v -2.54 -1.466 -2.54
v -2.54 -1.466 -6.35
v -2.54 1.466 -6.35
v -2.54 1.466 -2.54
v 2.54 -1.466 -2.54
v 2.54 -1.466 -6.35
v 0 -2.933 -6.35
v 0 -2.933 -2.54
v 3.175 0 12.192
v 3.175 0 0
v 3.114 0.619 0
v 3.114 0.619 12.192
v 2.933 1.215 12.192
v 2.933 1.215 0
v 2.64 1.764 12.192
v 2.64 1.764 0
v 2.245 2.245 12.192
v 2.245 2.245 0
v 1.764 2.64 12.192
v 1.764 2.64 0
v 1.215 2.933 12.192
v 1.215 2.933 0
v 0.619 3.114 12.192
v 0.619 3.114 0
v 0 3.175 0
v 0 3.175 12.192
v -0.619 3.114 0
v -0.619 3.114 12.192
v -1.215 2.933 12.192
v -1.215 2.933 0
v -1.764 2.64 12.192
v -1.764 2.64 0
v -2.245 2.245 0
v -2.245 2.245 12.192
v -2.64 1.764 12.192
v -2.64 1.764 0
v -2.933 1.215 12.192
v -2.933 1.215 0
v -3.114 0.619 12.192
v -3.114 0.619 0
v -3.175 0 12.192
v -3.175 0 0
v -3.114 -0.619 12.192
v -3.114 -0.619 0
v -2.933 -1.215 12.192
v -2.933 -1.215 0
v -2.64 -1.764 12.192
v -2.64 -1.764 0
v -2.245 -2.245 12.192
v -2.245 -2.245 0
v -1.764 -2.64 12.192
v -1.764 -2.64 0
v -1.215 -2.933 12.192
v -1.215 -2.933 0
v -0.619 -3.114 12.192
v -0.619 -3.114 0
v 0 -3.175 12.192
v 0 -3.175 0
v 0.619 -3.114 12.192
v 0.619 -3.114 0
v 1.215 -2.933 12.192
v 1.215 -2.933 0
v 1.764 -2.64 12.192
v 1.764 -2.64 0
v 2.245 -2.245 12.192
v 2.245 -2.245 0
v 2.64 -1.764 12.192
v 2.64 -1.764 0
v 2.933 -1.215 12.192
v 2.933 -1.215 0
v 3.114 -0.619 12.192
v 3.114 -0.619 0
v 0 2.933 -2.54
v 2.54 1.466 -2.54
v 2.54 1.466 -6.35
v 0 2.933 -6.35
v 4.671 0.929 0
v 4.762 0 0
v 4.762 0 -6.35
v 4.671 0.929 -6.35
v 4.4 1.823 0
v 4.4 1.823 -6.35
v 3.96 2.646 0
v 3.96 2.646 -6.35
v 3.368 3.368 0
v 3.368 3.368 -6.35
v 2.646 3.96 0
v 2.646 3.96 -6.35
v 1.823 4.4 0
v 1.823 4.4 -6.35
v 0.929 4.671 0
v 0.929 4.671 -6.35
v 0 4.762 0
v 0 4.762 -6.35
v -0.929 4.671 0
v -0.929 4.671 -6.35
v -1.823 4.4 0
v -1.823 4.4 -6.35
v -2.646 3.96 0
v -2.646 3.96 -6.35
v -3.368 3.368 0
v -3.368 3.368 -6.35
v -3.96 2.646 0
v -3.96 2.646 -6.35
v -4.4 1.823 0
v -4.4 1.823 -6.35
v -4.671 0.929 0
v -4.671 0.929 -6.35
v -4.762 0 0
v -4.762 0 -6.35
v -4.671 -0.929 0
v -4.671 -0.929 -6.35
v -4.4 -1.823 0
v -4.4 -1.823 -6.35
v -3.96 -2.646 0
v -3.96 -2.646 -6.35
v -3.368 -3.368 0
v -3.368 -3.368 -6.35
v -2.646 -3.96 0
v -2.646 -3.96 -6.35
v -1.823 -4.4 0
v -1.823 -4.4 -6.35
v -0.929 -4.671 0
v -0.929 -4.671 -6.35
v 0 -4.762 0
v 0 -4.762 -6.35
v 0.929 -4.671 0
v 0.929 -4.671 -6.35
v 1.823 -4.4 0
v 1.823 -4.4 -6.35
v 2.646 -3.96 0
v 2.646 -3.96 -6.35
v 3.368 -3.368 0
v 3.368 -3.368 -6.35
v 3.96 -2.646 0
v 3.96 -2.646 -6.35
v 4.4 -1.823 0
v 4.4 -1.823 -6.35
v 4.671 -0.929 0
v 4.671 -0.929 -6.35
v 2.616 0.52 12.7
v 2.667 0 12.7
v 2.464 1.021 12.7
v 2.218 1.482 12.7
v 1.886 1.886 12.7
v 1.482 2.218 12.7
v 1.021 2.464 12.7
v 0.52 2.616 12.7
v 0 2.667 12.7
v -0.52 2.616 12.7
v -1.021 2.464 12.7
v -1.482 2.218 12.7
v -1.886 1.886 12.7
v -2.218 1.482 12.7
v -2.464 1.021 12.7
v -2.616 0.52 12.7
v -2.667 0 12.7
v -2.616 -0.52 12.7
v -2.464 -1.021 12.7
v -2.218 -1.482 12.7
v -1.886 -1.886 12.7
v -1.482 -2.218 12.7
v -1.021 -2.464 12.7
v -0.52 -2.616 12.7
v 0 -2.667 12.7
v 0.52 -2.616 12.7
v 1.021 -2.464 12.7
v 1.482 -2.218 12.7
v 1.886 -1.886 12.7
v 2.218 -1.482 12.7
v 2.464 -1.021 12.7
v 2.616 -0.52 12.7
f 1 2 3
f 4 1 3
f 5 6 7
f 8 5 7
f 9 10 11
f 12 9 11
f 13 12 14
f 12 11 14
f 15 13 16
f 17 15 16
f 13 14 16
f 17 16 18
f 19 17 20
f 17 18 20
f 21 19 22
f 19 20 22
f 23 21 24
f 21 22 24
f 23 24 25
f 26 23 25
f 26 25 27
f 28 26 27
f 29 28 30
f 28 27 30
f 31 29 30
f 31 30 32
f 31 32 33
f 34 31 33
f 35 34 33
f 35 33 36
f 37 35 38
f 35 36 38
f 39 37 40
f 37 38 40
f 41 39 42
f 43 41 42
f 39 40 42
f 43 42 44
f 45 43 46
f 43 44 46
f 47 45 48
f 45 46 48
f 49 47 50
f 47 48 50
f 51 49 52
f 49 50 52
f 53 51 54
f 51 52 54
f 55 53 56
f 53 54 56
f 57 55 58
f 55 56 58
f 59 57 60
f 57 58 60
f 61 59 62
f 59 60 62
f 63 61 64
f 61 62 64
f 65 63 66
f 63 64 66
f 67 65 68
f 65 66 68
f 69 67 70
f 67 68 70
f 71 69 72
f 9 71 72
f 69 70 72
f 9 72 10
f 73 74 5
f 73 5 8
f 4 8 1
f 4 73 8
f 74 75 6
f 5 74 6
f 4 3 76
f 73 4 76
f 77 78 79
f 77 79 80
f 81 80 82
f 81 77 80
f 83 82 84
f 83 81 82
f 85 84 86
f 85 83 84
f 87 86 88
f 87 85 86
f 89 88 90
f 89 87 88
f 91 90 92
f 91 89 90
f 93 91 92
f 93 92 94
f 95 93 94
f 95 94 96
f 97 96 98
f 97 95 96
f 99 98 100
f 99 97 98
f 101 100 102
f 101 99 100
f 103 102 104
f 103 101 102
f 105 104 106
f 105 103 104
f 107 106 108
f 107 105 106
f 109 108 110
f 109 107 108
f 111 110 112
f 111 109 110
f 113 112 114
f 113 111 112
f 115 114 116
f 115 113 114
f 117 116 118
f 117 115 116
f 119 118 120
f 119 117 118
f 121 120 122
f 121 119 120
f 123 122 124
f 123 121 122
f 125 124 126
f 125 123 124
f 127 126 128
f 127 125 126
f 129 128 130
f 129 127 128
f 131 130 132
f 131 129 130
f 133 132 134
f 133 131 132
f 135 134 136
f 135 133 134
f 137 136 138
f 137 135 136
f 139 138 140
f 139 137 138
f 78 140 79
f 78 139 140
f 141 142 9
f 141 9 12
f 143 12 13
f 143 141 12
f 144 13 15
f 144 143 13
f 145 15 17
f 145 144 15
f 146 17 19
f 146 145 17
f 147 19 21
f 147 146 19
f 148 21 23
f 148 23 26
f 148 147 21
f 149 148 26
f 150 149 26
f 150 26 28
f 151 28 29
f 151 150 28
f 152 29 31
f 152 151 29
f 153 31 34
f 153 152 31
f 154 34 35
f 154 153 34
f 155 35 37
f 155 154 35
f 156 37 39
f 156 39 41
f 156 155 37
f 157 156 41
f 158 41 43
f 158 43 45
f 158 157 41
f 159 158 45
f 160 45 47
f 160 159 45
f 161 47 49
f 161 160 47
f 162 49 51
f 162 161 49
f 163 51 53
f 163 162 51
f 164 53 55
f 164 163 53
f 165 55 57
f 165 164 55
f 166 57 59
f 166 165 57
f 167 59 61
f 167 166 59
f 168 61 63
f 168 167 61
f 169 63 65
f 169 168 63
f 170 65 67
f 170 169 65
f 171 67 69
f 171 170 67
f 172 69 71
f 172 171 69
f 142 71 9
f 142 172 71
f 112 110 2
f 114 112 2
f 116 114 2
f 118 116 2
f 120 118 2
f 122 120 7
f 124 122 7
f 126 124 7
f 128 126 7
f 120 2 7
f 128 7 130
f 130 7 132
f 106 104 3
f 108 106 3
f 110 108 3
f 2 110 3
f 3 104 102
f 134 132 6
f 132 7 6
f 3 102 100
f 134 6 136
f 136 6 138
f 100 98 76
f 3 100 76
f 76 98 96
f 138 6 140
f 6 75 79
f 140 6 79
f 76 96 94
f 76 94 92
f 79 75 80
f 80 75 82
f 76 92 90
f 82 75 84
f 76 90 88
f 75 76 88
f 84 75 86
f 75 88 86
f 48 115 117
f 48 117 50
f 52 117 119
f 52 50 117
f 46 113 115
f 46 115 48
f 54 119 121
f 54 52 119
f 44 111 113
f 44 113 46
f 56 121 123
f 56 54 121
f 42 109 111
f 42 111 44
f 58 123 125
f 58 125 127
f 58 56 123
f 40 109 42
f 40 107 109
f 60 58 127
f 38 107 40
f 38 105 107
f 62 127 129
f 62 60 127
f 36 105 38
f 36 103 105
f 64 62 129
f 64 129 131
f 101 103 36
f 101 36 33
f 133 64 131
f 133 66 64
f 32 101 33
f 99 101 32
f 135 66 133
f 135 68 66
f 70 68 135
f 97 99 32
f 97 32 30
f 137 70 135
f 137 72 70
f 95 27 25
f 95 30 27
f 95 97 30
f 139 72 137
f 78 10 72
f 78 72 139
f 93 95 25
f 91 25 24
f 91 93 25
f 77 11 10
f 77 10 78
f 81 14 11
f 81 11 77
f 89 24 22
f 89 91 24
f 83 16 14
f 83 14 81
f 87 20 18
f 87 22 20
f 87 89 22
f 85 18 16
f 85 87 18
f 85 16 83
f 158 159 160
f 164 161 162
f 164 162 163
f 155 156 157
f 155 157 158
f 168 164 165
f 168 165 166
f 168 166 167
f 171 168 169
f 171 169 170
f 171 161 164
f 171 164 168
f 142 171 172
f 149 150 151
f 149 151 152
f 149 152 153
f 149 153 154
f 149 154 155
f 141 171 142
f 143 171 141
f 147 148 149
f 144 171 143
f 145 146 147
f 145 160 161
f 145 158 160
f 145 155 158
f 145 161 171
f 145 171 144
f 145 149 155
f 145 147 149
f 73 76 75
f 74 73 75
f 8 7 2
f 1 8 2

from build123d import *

# Parameters (mm, degrees)
SKETCH1_R           = 4.7625
BOSS_EXTRUDE1_DEPTH = 6.35
SKETCH2_R           = 3.175
BOSS_EXTRUDE2_DEPTH = 12.7
CHAMFER1_SIZE       = 0.508
CUT_EXTRUDE1_DEPTH  = 3.81


with BuildPart() as part:
    # Sketch1 → Boss-Extrude1 (new body)
    with BuildSketch(Plane.XY):
        Circle(SKETCH1_R)
    extrude(amount=-BOSS_EXTRUDE1_DEPTH)

    # Sketch2 → Boss-Extrude2 (add)
    with BuildSketch(Plane.XY):
        Circle(SKETCH2_R)
    extrude(amount=BOSS_EXTRUDE2_DEPTH)

    # Chamfer1
    chamfer1_edges = [part.edges().sort_by_distance(p)[0] for p in [
        (-3.175, 0, 12.7),
    ]]
    chamfer(chamfer1_edges, length=CHAMFER1_SIZE)

    # Sketch3 → Cut-Extrude1 (cut)
    with BuildSketch(Plane(origin=(0, 0, -6.35), x_dir=(-1, 0, 0), z_dir=(0, 0, -1))):
        Polygon((0, 2.932939367), (-2.54, 1.466469684), (-2.54, -1.466469684), (0, -2.932939367), (2.54, -1.466469684), (2.54, 1.466469684), align=None)
    extrude(amount=-CUT_EXTRUDE1_DEPTH, mode=Mode.SUBTRACT)


solid = part.part
